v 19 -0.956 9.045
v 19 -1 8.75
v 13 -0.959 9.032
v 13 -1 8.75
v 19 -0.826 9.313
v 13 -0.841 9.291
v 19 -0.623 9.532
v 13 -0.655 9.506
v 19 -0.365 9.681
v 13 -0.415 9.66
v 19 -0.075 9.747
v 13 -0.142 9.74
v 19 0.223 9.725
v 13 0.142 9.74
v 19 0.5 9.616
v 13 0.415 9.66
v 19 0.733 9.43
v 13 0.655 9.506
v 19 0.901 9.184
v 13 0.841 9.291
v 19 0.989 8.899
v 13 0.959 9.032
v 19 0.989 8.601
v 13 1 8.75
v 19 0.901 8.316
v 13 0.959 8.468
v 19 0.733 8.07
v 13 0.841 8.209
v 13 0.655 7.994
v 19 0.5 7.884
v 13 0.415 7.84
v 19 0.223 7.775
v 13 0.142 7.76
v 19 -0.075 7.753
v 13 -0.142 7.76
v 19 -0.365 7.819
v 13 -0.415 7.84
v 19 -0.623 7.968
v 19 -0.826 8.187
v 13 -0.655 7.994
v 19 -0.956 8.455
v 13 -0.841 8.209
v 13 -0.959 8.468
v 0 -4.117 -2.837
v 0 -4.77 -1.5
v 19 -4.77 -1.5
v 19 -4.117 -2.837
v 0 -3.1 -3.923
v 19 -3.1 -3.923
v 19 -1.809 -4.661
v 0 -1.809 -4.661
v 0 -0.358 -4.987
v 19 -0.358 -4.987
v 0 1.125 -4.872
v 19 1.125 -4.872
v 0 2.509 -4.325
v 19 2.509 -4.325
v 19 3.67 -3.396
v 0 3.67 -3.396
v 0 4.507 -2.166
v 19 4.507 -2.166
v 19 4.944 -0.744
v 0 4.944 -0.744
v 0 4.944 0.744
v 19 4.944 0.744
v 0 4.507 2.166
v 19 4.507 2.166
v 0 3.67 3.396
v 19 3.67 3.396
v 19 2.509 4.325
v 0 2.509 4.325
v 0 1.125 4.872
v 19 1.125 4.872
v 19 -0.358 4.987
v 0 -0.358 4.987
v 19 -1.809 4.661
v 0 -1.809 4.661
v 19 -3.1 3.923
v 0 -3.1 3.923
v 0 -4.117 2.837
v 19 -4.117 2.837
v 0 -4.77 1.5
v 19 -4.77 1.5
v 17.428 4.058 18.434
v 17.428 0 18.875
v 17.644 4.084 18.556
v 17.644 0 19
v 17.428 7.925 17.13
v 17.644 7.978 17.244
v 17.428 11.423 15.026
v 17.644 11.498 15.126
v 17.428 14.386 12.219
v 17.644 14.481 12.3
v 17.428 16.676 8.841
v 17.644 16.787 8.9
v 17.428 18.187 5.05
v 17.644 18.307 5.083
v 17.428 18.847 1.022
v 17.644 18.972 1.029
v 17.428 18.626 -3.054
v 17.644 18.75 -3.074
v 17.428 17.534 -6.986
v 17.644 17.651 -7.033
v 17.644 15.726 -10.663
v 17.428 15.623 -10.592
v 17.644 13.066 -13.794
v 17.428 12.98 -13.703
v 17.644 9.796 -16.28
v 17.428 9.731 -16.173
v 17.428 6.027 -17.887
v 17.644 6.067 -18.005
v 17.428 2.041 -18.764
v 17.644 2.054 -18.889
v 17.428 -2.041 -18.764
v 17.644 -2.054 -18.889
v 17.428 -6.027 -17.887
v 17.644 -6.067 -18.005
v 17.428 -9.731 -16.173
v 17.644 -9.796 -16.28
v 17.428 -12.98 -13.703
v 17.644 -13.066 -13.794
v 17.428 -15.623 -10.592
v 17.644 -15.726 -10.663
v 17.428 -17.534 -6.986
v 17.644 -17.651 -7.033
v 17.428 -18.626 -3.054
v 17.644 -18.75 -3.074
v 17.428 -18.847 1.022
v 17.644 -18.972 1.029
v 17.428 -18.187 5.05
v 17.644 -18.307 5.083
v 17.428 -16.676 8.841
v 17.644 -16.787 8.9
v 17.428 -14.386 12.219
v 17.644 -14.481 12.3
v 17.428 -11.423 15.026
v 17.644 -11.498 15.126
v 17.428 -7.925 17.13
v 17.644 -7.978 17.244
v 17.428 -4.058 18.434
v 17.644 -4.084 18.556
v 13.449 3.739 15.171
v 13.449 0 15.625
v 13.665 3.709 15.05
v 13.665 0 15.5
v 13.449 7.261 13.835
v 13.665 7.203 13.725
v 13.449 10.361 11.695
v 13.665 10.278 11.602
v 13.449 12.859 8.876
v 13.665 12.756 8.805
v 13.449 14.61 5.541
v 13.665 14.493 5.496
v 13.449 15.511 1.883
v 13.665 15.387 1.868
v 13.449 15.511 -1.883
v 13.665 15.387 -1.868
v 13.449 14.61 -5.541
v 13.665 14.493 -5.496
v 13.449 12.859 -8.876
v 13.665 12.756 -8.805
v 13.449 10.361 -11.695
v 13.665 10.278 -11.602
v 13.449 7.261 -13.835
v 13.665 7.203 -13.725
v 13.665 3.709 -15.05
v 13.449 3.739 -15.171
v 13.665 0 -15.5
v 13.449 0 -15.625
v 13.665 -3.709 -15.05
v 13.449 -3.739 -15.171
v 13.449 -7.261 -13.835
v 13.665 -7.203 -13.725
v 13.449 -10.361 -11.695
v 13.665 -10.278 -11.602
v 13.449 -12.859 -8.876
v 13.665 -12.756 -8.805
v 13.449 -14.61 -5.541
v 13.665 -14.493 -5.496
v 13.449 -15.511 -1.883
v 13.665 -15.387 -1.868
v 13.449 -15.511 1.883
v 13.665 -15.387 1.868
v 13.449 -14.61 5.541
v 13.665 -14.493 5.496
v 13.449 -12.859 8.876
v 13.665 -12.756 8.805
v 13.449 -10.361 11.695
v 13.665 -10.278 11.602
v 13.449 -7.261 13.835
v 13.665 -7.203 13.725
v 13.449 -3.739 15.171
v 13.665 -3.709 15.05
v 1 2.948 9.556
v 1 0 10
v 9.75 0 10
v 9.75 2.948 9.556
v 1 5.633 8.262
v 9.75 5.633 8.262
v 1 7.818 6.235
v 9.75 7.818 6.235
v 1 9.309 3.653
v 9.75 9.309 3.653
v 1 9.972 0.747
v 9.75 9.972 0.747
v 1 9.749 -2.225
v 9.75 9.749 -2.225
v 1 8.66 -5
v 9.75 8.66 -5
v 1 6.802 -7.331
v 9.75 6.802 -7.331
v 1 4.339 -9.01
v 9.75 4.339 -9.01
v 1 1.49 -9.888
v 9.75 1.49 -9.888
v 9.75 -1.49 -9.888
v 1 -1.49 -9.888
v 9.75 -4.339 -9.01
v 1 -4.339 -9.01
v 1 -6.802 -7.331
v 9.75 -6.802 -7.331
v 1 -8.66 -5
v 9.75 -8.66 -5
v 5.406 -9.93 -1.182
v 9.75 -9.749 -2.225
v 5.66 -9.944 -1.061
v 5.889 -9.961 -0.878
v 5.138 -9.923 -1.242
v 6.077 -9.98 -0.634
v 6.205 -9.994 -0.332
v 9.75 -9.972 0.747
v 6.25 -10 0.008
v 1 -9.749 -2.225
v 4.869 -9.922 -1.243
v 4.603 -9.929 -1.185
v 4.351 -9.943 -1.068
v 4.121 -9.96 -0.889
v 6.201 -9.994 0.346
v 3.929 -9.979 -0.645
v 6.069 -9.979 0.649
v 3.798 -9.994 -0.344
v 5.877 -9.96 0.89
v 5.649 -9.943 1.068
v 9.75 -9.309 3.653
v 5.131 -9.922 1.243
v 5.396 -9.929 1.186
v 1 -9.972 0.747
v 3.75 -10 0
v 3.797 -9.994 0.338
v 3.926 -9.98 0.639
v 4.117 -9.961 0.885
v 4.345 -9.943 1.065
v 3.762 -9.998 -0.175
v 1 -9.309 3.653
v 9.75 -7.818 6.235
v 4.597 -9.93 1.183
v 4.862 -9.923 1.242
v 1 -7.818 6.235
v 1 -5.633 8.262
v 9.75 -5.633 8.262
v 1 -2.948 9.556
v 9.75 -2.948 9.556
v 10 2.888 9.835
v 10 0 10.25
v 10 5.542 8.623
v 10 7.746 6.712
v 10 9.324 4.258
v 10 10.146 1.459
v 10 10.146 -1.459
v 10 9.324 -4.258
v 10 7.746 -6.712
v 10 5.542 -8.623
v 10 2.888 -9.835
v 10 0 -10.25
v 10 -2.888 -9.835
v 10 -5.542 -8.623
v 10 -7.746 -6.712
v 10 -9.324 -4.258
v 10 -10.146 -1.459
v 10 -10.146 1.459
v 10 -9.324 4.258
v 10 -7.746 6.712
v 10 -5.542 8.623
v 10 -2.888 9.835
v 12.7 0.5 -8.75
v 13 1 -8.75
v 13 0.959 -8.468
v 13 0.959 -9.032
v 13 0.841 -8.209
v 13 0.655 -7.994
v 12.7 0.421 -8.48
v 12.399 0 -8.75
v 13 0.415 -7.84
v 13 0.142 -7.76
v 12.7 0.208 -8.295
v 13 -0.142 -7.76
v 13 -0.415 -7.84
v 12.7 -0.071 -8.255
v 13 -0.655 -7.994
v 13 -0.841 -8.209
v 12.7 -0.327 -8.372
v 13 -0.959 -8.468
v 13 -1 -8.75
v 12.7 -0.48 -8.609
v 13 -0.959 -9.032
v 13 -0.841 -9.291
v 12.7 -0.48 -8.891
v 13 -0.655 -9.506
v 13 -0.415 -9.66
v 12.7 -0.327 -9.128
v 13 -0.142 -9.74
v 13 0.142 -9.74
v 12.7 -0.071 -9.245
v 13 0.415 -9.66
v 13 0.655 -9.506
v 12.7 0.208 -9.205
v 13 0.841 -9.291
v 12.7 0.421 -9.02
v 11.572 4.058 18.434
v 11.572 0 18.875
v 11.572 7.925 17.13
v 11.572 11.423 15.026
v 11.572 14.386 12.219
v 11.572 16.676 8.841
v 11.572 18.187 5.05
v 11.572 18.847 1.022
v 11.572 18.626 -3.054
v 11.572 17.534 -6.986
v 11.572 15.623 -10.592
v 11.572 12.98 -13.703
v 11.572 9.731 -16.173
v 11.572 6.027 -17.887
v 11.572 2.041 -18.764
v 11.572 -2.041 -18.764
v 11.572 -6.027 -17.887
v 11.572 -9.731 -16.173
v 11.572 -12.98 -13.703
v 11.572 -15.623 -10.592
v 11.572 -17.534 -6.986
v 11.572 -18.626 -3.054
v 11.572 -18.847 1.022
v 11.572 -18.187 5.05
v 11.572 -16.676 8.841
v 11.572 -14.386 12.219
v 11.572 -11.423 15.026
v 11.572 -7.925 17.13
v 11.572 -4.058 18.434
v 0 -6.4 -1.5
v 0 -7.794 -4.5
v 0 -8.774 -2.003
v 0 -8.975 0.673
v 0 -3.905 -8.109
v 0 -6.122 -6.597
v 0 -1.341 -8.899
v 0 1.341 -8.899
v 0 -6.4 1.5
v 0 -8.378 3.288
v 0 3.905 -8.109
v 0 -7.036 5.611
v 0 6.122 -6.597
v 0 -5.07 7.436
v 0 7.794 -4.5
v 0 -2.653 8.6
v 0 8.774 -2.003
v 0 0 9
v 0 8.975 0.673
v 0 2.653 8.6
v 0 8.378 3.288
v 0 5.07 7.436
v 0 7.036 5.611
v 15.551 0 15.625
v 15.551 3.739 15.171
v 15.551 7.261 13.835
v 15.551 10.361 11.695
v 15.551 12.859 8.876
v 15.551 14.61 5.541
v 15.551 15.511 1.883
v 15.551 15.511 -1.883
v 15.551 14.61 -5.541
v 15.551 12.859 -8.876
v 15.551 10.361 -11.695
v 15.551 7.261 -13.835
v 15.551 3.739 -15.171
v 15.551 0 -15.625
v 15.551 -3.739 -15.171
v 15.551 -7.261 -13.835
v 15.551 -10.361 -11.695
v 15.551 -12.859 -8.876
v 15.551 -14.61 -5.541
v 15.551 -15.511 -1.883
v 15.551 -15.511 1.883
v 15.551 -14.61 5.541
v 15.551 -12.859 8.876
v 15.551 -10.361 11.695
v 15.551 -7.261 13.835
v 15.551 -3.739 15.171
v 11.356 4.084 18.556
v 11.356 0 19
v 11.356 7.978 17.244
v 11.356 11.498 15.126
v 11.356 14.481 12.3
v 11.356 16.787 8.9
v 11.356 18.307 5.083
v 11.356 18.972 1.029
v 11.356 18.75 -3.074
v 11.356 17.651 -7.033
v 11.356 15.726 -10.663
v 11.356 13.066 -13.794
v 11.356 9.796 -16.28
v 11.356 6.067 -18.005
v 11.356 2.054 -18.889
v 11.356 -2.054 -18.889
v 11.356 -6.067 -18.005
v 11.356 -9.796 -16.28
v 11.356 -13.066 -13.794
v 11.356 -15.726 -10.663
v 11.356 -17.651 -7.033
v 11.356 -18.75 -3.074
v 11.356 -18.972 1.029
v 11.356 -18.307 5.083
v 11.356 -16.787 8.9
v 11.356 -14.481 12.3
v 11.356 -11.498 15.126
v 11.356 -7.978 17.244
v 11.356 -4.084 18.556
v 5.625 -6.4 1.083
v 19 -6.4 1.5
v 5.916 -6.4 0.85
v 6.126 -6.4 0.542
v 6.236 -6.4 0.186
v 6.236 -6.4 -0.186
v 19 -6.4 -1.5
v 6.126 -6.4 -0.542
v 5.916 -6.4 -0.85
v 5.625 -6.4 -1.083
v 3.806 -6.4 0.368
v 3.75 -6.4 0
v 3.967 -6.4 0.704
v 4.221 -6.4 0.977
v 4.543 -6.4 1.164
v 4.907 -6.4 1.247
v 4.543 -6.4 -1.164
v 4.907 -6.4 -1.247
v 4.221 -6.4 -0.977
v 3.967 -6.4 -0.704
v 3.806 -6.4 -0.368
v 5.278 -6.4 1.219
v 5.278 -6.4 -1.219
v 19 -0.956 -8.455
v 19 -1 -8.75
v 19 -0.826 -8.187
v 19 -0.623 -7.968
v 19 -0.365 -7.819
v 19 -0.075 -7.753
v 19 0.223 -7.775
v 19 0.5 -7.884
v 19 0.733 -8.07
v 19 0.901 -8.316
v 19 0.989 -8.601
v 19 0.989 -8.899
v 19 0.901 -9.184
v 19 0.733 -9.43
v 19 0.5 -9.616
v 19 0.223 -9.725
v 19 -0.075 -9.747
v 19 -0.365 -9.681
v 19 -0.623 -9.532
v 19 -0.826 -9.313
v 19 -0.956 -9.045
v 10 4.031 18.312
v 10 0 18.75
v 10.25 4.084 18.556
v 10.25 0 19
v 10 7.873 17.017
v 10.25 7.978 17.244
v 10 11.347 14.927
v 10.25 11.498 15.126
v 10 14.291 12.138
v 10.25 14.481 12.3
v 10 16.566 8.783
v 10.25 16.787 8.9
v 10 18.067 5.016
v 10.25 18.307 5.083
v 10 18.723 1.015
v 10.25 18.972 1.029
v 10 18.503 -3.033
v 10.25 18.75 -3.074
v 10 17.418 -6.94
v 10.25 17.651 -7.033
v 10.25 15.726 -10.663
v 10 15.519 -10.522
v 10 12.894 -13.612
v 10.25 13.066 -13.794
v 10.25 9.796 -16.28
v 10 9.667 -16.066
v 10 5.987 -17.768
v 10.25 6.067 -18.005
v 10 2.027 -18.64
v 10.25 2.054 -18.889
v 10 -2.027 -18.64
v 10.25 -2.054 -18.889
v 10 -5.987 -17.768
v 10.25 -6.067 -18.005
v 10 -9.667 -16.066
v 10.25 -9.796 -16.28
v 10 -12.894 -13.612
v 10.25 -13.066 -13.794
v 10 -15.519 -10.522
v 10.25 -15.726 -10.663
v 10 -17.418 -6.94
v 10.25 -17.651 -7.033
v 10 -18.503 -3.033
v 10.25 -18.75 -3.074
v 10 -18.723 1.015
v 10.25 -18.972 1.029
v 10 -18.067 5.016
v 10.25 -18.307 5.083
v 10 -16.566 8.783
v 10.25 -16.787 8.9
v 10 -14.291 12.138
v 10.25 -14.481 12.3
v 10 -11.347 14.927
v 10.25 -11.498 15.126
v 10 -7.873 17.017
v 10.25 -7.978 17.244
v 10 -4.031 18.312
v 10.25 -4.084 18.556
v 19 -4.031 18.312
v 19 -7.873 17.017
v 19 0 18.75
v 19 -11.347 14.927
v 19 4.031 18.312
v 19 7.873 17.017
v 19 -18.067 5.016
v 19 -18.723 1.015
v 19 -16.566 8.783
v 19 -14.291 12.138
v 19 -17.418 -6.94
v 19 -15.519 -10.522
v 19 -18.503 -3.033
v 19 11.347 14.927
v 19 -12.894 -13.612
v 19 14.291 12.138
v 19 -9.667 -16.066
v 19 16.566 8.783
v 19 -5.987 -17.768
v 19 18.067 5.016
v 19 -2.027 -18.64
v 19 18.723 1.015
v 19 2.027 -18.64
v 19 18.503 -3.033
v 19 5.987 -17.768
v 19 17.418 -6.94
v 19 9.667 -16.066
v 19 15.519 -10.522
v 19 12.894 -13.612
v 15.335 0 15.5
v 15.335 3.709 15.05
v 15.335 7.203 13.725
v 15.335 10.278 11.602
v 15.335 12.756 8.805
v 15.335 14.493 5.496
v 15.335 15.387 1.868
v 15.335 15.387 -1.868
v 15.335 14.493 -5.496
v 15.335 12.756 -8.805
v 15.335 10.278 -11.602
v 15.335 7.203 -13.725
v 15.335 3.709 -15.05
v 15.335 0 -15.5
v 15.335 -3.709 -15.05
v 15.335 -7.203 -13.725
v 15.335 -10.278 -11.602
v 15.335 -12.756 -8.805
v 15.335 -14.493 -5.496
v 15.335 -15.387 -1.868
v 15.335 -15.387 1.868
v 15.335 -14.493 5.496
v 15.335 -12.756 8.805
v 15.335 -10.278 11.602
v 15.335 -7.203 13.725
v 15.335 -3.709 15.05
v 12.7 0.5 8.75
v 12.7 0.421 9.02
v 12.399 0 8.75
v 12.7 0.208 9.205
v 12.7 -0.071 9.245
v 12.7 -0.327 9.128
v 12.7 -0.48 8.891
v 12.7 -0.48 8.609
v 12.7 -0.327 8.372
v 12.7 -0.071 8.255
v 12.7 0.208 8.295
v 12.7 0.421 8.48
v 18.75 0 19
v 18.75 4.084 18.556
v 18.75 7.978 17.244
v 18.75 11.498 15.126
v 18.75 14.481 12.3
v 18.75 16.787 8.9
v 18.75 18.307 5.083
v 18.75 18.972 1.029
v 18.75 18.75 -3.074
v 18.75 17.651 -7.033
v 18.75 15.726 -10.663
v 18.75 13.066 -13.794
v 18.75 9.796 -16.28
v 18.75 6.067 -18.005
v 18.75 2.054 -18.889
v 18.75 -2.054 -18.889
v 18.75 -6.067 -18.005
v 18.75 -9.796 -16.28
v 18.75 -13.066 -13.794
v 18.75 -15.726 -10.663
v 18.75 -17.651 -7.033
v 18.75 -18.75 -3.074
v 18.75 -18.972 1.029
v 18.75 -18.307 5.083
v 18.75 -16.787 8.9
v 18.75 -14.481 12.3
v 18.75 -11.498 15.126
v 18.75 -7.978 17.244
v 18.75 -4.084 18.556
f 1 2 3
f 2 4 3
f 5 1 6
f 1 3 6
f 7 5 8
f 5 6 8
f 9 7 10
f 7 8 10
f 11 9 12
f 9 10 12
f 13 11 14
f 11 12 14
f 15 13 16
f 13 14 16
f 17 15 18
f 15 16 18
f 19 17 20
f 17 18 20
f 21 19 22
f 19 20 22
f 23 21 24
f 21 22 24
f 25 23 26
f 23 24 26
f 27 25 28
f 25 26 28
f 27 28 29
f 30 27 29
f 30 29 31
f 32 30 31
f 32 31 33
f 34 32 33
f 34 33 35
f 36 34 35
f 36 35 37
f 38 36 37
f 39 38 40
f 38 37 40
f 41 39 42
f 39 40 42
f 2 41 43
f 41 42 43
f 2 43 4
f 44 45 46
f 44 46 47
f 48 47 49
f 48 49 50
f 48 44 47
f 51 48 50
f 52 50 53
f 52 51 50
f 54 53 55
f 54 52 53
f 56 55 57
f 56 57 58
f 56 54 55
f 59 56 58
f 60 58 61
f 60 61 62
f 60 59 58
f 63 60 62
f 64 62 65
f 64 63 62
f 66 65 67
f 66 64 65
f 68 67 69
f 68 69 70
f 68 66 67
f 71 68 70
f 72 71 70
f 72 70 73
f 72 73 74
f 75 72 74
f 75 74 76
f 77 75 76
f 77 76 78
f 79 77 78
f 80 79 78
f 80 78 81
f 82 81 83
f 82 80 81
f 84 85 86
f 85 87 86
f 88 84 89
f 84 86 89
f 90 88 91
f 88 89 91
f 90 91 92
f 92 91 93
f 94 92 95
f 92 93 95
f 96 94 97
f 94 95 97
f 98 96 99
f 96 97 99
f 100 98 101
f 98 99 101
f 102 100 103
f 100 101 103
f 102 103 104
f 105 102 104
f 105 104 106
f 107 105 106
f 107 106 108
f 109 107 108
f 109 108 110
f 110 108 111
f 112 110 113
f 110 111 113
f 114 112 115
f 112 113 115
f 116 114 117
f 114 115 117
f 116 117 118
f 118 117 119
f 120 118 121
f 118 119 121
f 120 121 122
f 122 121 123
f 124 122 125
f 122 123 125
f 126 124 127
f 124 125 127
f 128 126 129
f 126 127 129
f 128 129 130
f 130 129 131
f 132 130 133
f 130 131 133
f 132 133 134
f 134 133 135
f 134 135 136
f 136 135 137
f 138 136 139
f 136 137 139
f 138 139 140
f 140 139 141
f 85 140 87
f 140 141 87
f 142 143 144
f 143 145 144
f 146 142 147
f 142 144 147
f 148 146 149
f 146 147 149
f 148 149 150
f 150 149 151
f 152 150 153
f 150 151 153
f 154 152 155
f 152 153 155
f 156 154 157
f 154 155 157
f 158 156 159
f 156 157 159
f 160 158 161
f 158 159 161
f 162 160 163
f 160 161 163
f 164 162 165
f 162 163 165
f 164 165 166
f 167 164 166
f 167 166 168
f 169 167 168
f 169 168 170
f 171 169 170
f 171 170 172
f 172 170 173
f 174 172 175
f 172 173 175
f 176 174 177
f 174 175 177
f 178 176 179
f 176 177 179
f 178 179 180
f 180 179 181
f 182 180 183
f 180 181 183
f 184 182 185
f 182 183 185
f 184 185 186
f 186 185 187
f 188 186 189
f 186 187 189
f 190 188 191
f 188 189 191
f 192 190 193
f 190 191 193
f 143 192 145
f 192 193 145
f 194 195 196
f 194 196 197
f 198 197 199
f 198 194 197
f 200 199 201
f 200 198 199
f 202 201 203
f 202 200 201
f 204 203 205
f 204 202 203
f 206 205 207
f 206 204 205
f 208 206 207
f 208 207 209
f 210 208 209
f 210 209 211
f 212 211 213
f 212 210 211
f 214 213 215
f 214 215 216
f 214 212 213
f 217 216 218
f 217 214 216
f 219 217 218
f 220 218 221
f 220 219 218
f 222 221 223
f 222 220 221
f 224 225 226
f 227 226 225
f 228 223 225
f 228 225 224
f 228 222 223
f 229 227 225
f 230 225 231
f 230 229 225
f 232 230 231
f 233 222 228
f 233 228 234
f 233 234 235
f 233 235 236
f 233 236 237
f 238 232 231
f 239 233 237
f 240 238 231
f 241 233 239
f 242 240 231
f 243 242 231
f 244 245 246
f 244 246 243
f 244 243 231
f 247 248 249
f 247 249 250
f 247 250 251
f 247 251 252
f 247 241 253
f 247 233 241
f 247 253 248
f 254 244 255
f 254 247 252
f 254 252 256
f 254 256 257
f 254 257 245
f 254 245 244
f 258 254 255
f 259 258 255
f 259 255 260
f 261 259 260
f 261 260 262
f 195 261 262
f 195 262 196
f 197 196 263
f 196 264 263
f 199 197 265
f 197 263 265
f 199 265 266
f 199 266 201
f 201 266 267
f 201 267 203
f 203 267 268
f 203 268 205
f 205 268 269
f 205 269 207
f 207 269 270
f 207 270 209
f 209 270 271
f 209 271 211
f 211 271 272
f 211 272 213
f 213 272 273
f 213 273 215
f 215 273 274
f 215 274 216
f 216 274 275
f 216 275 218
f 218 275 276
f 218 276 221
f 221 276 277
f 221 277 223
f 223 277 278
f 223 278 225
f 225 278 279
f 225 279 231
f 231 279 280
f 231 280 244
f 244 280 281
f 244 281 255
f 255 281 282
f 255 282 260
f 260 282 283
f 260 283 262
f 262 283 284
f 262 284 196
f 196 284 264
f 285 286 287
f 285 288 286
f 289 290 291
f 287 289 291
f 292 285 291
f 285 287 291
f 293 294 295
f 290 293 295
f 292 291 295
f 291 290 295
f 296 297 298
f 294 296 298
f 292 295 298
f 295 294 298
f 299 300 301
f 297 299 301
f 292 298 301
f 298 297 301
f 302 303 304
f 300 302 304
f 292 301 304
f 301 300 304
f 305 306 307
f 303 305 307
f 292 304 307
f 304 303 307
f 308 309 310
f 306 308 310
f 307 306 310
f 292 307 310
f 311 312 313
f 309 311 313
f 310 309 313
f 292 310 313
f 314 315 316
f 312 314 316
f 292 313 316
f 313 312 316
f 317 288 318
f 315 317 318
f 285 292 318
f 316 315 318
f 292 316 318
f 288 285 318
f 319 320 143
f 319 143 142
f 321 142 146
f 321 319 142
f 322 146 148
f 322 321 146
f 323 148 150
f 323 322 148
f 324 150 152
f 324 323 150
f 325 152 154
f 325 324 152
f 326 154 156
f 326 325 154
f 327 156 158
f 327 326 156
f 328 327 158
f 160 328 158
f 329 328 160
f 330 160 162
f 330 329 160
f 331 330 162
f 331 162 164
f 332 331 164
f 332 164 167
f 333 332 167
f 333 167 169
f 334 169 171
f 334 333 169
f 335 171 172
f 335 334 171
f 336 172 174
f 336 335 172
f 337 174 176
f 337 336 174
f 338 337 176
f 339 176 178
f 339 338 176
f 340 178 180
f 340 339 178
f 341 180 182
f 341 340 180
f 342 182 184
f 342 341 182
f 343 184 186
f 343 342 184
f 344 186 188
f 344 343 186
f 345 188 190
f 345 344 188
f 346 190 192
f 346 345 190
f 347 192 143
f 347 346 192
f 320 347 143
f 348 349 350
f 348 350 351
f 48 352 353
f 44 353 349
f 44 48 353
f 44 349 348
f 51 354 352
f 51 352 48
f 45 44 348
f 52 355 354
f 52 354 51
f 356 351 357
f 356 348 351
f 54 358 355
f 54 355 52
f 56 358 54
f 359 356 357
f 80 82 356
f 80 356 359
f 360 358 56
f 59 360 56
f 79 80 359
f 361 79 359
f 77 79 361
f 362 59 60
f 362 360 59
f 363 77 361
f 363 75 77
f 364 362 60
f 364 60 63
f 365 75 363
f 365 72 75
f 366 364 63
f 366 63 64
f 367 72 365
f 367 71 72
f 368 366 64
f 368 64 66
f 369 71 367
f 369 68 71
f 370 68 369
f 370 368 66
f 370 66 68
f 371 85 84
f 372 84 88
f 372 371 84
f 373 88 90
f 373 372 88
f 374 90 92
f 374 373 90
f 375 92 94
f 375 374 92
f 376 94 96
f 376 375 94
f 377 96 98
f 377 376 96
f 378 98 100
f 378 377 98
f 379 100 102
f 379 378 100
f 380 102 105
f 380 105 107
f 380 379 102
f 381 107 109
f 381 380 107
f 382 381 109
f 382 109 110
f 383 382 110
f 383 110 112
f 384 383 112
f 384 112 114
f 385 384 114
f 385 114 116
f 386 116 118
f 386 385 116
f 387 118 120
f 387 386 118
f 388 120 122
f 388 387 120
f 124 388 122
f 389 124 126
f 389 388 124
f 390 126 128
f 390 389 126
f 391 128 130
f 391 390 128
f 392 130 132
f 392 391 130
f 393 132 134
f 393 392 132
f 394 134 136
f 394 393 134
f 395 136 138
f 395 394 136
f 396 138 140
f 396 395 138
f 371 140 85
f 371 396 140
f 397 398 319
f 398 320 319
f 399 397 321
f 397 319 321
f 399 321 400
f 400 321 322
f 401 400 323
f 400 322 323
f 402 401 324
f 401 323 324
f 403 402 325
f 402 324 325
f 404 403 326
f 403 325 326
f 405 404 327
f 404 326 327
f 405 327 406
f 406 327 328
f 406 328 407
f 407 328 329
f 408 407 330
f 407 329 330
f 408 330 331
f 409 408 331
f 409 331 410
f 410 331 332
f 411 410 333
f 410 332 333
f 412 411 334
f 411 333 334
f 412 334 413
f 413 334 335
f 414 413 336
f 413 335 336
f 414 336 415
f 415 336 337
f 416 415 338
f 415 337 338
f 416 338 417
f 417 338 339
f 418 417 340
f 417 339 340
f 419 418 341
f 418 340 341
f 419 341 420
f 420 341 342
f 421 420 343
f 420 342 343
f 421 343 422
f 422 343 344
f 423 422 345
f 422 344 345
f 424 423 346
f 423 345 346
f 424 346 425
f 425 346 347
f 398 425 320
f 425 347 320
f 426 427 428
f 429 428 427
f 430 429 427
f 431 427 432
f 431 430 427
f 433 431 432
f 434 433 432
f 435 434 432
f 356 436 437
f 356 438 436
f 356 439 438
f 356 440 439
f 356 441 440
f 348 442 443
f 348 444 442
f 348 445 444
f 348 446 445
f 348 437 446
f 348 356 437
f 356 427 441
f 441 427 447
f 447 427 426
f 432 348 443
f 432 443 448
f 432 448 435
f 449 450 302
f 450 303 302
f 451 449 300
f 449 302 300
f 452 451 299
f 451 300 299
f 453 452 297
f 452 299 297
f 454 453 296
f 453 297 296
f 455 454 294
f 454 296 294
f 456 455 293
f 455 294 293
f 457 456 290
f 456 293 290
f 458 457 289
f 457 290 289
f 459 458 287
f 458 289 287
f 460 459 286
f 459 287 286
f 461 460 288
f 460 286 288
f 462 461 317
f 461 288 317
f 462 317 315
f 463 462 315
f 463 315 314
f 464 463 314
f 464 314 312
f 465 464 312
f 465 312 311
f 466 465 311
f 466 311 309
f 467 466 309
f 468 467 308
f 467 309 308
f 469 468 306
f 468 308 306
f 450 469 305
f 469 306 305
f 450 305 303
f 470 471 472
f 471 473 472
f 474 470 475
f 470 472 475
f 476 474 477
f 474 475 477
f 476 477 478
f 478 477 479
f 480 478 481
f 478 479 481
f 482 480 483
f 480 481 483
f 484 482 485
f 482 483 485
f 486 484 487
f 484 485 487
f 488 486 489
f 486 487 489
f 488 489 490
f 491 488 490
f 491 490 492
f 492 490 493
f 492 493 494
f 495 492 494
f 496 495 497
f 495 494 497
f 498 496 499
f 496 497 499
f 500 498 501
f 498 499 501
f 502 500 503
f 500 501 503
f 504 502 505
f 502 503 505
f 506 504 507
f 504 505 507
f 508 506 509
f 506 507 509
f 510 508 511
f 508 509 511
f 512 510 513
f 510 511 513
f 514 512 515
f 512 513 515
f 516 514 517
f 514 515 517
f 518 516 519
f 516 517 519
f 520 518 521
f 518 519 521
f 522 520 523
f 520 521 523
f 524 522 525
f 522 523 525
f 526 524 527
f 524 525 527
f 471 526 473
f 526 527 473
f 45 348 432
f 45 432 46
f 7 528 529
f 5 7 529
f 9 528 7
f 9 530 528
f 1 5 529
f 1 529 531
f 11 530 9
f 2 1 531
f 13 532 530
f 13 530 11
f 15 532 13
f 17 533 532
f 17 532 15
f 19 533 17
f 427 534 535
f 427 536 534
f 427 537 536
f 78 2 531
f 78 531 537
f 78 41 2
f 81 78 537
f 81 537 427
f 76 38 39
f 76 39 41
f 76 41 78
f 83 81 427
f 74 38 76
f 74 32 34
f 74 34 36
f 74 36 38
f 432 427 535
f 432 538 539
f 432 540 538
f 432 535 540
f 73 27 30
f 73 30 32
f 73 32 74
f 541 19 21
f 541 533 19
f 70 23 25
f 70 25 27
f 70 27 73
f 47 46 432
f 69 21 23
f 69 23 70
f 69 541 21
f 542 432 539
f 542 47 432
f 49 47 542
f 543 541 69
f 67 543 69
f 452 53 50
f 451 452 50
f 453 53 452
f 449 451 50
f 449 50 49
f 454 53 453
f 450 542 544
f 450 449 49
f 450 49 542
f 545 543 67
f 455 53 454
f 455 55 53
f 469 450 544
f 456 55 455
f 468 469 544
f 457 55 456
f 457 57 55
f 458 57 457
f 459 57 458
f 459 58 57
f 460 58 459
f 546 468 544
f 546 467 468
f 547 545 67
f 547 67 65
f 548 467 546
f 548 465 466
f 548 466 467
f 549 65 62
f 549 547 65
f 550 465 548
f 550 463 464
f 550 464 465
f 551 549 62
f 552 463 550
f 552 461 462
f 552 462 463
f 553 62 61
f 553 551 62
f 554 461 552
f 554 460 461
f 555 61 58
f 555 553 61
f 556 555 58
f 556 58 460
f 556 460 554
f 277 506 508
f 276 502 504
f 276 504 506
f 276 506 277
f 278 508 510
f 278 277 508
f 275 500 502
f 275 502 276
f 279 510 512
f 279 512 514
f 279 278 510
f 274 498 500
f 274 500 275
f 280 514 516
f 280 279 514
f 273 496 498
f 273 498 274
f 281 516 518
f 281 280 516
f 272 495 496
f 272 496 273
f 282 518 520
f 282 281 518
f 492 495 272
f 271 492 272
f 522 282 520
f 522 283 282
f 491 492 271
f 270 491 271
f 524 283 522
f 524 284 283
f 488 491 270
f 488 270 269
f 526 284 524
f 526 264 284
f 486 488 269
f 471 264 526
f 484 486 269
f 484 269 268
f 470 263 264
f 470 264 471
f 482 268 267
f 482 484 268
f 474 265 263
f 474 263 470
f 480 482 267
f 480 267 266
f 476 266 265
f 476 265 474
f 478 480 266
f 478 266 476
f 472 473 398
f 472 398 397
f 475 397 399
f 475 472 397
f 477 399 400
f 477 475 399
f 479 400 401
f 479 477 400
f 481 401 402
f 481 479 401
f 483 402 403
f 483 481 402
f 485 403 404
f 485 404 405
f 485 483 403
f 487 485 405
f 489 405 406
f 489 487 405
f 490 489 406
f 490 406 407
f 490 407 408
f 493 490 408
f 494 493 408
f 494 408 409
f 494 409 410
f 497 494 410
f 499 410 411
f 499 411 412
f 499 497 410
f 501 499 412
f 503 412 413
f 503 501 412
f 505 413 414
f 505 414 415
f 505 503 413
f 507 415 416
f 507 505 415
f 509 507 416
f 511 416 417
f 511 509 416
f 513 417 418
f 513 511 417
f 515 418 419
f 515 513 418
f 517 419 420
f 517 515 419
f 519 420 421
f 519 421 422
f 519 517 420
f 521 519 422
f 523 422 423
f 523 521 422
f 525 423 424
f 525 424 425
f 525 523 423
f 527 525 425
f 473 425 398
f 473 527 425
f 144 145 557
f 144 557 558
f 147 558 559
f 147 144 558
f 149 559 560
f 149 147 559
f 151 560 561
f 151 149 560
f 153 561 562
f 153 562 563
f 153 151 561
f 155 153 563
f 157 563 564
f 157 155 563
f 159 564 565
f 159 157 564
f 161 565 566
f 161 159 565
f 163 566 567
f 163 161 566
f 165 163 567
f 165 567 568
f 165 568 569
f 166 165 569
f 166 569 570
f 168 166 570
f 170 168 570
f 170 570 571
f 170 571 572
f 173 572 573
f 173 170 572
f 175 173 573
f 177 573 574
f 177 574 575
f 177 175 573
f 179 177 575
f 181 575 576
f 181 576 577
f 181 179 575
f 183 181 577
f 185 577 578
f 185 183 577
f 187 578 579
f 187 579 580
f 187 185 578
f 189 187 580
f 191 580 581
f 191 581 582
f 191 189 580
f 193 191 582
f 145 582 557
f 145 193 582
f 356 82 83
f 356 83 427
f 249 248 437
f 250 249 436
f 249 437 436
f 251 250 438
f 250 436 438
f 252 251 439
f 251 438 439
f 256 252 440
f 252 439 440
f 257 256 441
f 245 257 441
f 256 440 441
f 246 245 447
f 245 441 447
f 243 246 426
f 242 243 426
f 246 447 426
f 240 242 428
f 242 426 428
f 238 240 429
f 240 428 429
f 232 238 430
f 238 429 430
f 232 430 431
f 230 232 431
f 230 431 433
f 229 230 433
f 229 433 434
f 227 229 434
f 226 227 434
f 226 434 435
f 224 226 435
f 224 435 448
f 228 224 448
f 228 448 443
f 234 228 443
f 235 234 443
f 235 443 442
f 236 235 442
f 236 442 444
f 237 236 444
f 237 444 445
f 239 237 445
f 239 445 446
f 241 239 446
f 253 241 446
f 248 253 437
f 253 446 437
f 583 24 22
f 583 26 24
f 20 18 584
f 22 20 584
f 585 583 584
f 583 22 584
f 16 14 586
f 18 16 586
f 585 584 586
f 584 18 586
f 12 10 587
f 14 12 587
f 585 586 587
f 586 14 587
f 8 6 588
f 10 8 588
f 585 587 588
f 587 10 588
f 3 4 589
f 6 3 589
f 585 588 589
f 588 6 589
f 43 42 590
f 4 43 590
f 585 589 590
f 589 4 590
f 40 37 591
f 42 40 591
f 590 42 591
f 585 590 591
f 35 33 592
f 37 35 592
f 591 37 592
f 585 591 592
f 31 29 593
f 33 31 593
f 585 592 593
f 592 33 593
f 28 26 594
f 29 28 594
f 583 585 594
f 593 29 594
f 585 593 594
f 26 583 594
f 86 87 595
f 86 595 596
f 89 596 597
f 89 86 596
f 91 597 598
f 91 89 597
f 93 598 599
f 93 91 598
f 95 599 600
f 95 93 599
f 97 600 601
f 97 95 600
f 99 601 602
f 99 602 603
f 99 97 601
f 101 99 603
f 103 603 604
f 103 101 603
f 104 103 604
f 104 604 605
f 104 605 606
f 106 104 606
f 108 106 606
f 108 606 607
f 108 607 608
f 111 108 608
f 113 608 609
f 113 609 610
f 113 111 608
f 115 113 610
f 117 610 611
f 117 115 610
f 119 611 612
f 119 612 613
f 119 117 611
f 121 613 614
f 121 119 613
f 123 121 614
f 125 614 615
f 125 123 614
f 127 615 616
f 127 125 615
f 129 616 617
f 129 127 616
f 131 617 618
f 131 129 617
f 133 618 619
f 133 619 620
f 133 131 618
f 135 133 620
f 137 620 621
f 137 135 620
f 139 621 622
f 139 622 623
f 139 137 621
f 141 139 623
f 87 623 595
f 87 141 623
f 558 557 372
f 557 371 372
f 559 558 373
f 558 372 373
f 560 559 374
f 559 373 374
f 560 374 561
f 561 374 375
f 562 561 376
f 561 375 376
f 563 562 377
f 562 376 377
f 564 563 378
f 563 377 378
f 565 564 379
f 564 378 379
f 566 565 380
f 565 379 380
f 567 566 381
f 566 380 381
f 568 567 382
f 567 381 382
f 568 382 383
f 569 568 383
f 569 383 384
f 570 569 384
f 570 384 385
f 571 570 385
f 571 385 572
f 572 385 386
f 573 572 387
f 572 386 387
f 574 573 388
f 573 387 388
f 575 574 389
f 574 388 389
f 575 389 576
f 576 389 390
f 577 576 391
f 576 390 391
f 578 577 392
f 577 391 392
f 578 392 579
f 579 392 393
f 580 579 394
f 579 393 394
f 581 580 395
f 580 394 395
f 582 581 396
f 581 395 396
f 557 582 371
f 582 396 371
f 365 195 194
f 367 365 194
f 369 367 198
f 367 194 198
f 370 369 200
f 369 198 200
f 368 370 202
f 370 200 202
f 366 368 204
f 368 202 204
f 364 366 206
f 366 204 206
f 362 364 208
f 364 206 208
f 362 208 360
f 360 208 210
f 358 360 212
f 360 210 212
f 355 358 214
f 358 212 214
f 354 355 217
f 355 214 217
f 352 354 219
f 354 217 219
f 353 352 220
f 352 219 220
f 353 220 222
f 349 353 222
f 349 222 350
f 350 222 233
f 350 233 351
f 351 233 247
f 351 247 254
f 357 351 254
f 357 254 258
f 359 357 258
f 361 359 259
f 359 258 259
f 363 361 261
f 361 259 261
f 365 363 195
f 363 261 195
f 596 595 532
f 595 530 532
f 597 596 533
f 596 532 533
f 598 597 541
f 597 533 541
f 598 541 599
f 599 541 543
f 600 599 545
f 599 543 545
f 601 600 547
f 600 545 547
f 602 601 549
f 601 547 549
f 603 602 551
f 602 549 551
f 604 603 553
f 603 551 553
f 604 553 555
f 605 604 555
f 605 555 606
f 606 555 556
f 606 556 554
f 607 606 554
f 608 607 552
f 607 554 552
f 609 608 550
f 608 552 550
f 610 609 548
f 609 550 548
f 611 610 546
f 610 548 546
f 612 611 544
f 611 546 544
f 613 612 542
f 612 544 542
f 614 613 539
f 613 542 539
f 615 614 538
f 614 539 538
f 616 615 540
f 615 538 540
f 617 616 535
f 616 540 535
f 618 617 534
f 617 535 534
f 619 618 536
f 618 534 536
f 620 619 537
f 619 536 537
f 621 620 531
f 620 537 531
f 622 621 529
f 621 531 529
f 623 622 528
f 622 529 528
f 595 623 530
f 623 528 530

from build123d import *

# Parameters (mm, degrees)
F3_SIZE   = 1
F6_DEPTH  = 19
F8_D      = 2.5
F8_DEPTH  = 14.2
F8_TIP    = 0.7510757738
F10_D     = 2
F10_DEPTH = 6
F10_TIP   = 0.600860619


# Not quite as in the source:
# - a fillet or chamfer that OpenCascade refuses, or shapes differently, is made with other operations: its cross-section is extruded or revolved along the edge and cut away or added


with BuildPart() as f2:
    # F0 (on Front) → F2 (revolve)
    with BuildSketch(Plane.XZ):
        Polygon((0, 10), (0, 0), (19, 0), (19, 19), (17.5, 19), (15.4792740578, 15.5), (13.5207259422, 15.5), (11.5, 19), (10, 19), (10, 10), align=None)
    revolve(axis=Axis((9.5, 0, 0), (-1, 0, 0)))

    # F3
    f3_edges = [f2.edges().sort_by_distance(p)[0] for p in [
        (0, 0, -10),
    ]]
    chamfer(f3_edges, length=F3_SIZE)

    # F4: chamfer of 0.25 on 10 edges, made by hand

    # F4_s1 → F4_t2 (revolve)
    with BuildSketch(Plane.XZ):
        Polygon((9.75, 10), (10, 10.25), (10, 10), align=None)
    revolve(axis=Axis((10, 0, 0), (-1, 0, 0)))

    # F4_s3 → F4_t4 (revolve)
    with BuildSketch(Plane.XZ):
        Polygon((15.3349364905, 15.5), (15.5514428415, 15.625), (15.4792740578, 15.5), align=None)
    revolve(axis=Axis((15.4792740578, 0, 0), (-1, 0, 0)))

    # F4_s5 → F4_t6 (revolve)
    with BuildSketch(Plane.XZ):
        Polygon((13.4485571585, 15.625), (13.6650635095, 15.5), (13.5207259422, 15.5), align=None)
    revolve(axis=Axis((13.5207259422, 0, 0), (-1, 0, 0)))

    # F4_s7 → F4_t8 (revolve, cut)
    with BuildSketch(Plane.XZ):
        Polygon((11.3556624327, 19), (11.5721687836, 18.875), (11.5, 19), align=None)
    revolve(axis=Axis((11.5, 0, 0), (-1, 0, 0)), mode=Mode.SUBTRACT)

    # F4_s9 → F4_t10 (revolve, cut)
    with BuildSketch(Plane.XZ):
        Polygon((10, 18.75), (10.25, 19), (10, 19), align=None)
    revolve(axis=Axis((10, 0, 0), (-1, 0, 0)), mode=Mode.SUBTRACT)

    # F4_s11 → F4_t12 (revolve, cut)
    with BuildSketch(Plane.XZ):
        Polygon((18.75, 19), (19, 18.75), (19, 19), align=None)
    revolve(axis=Axis((19, 0, 0), (-1, 0, 0)), mode=Mode.SUBTRACT)

    # F4_s13 → F4_t14 (revolve, cut)
    with BuildSketch(Plane.XZ):
        Polygon((17.4278312164, 18.875), (17.6443375673, 19), (17.5, 19), align=None)
    revolve(axis=Axis((17.5, 0, 0), (-1, 0, 0)), mode=Mode.SUBTRACT)

    # F5 (on Right) → F6 (cut, through all)
    with BuildSketch(Plane.YZ):
        with BuildLine():
            Line((-6.4, -1.5), (-4.7696960071, -1.5))
            ThreePointArc((-4.7696960071, -1.5), (5, 0), (-4.7696960071, 1.5))
            Line((-4.7696960071, 1.5), (-6.4, 1.5))
            Line((-6.4, 1.5), (-6.4, -1.5))
        make_face()
    extrude(amount=F6_DEPTH, mode=Mode.SUBTRACT)

    # F8
    with Locations(Plane.XZ.offset(10)):
        with Locations((5, 0)):
            Hole(F8_D / 2, depth=F8_DEPTH)
            with Locations((0, 0, -(F8_DEPTH + F8_TIP / 2))):  # 118° drill point
                Cone(0, F8_D / 2, F8_TIP, mode=Mode.SUBTRACT)

    # F10
    with Locations(Plane.YZ.offset(19)):
        with Locations((0, 8.75), (0, -8.75)):
            Hole(F10_D / 2, depth=F10_DEPTH)
            with Locations((0, 0, -(F10_DEPTH + F10_TIP / 2))):  # 118° drill point
                Cone(0, F10_D / 2, F10_TIP, mode=Mode.SUBTRACT)


solid = f2.part
